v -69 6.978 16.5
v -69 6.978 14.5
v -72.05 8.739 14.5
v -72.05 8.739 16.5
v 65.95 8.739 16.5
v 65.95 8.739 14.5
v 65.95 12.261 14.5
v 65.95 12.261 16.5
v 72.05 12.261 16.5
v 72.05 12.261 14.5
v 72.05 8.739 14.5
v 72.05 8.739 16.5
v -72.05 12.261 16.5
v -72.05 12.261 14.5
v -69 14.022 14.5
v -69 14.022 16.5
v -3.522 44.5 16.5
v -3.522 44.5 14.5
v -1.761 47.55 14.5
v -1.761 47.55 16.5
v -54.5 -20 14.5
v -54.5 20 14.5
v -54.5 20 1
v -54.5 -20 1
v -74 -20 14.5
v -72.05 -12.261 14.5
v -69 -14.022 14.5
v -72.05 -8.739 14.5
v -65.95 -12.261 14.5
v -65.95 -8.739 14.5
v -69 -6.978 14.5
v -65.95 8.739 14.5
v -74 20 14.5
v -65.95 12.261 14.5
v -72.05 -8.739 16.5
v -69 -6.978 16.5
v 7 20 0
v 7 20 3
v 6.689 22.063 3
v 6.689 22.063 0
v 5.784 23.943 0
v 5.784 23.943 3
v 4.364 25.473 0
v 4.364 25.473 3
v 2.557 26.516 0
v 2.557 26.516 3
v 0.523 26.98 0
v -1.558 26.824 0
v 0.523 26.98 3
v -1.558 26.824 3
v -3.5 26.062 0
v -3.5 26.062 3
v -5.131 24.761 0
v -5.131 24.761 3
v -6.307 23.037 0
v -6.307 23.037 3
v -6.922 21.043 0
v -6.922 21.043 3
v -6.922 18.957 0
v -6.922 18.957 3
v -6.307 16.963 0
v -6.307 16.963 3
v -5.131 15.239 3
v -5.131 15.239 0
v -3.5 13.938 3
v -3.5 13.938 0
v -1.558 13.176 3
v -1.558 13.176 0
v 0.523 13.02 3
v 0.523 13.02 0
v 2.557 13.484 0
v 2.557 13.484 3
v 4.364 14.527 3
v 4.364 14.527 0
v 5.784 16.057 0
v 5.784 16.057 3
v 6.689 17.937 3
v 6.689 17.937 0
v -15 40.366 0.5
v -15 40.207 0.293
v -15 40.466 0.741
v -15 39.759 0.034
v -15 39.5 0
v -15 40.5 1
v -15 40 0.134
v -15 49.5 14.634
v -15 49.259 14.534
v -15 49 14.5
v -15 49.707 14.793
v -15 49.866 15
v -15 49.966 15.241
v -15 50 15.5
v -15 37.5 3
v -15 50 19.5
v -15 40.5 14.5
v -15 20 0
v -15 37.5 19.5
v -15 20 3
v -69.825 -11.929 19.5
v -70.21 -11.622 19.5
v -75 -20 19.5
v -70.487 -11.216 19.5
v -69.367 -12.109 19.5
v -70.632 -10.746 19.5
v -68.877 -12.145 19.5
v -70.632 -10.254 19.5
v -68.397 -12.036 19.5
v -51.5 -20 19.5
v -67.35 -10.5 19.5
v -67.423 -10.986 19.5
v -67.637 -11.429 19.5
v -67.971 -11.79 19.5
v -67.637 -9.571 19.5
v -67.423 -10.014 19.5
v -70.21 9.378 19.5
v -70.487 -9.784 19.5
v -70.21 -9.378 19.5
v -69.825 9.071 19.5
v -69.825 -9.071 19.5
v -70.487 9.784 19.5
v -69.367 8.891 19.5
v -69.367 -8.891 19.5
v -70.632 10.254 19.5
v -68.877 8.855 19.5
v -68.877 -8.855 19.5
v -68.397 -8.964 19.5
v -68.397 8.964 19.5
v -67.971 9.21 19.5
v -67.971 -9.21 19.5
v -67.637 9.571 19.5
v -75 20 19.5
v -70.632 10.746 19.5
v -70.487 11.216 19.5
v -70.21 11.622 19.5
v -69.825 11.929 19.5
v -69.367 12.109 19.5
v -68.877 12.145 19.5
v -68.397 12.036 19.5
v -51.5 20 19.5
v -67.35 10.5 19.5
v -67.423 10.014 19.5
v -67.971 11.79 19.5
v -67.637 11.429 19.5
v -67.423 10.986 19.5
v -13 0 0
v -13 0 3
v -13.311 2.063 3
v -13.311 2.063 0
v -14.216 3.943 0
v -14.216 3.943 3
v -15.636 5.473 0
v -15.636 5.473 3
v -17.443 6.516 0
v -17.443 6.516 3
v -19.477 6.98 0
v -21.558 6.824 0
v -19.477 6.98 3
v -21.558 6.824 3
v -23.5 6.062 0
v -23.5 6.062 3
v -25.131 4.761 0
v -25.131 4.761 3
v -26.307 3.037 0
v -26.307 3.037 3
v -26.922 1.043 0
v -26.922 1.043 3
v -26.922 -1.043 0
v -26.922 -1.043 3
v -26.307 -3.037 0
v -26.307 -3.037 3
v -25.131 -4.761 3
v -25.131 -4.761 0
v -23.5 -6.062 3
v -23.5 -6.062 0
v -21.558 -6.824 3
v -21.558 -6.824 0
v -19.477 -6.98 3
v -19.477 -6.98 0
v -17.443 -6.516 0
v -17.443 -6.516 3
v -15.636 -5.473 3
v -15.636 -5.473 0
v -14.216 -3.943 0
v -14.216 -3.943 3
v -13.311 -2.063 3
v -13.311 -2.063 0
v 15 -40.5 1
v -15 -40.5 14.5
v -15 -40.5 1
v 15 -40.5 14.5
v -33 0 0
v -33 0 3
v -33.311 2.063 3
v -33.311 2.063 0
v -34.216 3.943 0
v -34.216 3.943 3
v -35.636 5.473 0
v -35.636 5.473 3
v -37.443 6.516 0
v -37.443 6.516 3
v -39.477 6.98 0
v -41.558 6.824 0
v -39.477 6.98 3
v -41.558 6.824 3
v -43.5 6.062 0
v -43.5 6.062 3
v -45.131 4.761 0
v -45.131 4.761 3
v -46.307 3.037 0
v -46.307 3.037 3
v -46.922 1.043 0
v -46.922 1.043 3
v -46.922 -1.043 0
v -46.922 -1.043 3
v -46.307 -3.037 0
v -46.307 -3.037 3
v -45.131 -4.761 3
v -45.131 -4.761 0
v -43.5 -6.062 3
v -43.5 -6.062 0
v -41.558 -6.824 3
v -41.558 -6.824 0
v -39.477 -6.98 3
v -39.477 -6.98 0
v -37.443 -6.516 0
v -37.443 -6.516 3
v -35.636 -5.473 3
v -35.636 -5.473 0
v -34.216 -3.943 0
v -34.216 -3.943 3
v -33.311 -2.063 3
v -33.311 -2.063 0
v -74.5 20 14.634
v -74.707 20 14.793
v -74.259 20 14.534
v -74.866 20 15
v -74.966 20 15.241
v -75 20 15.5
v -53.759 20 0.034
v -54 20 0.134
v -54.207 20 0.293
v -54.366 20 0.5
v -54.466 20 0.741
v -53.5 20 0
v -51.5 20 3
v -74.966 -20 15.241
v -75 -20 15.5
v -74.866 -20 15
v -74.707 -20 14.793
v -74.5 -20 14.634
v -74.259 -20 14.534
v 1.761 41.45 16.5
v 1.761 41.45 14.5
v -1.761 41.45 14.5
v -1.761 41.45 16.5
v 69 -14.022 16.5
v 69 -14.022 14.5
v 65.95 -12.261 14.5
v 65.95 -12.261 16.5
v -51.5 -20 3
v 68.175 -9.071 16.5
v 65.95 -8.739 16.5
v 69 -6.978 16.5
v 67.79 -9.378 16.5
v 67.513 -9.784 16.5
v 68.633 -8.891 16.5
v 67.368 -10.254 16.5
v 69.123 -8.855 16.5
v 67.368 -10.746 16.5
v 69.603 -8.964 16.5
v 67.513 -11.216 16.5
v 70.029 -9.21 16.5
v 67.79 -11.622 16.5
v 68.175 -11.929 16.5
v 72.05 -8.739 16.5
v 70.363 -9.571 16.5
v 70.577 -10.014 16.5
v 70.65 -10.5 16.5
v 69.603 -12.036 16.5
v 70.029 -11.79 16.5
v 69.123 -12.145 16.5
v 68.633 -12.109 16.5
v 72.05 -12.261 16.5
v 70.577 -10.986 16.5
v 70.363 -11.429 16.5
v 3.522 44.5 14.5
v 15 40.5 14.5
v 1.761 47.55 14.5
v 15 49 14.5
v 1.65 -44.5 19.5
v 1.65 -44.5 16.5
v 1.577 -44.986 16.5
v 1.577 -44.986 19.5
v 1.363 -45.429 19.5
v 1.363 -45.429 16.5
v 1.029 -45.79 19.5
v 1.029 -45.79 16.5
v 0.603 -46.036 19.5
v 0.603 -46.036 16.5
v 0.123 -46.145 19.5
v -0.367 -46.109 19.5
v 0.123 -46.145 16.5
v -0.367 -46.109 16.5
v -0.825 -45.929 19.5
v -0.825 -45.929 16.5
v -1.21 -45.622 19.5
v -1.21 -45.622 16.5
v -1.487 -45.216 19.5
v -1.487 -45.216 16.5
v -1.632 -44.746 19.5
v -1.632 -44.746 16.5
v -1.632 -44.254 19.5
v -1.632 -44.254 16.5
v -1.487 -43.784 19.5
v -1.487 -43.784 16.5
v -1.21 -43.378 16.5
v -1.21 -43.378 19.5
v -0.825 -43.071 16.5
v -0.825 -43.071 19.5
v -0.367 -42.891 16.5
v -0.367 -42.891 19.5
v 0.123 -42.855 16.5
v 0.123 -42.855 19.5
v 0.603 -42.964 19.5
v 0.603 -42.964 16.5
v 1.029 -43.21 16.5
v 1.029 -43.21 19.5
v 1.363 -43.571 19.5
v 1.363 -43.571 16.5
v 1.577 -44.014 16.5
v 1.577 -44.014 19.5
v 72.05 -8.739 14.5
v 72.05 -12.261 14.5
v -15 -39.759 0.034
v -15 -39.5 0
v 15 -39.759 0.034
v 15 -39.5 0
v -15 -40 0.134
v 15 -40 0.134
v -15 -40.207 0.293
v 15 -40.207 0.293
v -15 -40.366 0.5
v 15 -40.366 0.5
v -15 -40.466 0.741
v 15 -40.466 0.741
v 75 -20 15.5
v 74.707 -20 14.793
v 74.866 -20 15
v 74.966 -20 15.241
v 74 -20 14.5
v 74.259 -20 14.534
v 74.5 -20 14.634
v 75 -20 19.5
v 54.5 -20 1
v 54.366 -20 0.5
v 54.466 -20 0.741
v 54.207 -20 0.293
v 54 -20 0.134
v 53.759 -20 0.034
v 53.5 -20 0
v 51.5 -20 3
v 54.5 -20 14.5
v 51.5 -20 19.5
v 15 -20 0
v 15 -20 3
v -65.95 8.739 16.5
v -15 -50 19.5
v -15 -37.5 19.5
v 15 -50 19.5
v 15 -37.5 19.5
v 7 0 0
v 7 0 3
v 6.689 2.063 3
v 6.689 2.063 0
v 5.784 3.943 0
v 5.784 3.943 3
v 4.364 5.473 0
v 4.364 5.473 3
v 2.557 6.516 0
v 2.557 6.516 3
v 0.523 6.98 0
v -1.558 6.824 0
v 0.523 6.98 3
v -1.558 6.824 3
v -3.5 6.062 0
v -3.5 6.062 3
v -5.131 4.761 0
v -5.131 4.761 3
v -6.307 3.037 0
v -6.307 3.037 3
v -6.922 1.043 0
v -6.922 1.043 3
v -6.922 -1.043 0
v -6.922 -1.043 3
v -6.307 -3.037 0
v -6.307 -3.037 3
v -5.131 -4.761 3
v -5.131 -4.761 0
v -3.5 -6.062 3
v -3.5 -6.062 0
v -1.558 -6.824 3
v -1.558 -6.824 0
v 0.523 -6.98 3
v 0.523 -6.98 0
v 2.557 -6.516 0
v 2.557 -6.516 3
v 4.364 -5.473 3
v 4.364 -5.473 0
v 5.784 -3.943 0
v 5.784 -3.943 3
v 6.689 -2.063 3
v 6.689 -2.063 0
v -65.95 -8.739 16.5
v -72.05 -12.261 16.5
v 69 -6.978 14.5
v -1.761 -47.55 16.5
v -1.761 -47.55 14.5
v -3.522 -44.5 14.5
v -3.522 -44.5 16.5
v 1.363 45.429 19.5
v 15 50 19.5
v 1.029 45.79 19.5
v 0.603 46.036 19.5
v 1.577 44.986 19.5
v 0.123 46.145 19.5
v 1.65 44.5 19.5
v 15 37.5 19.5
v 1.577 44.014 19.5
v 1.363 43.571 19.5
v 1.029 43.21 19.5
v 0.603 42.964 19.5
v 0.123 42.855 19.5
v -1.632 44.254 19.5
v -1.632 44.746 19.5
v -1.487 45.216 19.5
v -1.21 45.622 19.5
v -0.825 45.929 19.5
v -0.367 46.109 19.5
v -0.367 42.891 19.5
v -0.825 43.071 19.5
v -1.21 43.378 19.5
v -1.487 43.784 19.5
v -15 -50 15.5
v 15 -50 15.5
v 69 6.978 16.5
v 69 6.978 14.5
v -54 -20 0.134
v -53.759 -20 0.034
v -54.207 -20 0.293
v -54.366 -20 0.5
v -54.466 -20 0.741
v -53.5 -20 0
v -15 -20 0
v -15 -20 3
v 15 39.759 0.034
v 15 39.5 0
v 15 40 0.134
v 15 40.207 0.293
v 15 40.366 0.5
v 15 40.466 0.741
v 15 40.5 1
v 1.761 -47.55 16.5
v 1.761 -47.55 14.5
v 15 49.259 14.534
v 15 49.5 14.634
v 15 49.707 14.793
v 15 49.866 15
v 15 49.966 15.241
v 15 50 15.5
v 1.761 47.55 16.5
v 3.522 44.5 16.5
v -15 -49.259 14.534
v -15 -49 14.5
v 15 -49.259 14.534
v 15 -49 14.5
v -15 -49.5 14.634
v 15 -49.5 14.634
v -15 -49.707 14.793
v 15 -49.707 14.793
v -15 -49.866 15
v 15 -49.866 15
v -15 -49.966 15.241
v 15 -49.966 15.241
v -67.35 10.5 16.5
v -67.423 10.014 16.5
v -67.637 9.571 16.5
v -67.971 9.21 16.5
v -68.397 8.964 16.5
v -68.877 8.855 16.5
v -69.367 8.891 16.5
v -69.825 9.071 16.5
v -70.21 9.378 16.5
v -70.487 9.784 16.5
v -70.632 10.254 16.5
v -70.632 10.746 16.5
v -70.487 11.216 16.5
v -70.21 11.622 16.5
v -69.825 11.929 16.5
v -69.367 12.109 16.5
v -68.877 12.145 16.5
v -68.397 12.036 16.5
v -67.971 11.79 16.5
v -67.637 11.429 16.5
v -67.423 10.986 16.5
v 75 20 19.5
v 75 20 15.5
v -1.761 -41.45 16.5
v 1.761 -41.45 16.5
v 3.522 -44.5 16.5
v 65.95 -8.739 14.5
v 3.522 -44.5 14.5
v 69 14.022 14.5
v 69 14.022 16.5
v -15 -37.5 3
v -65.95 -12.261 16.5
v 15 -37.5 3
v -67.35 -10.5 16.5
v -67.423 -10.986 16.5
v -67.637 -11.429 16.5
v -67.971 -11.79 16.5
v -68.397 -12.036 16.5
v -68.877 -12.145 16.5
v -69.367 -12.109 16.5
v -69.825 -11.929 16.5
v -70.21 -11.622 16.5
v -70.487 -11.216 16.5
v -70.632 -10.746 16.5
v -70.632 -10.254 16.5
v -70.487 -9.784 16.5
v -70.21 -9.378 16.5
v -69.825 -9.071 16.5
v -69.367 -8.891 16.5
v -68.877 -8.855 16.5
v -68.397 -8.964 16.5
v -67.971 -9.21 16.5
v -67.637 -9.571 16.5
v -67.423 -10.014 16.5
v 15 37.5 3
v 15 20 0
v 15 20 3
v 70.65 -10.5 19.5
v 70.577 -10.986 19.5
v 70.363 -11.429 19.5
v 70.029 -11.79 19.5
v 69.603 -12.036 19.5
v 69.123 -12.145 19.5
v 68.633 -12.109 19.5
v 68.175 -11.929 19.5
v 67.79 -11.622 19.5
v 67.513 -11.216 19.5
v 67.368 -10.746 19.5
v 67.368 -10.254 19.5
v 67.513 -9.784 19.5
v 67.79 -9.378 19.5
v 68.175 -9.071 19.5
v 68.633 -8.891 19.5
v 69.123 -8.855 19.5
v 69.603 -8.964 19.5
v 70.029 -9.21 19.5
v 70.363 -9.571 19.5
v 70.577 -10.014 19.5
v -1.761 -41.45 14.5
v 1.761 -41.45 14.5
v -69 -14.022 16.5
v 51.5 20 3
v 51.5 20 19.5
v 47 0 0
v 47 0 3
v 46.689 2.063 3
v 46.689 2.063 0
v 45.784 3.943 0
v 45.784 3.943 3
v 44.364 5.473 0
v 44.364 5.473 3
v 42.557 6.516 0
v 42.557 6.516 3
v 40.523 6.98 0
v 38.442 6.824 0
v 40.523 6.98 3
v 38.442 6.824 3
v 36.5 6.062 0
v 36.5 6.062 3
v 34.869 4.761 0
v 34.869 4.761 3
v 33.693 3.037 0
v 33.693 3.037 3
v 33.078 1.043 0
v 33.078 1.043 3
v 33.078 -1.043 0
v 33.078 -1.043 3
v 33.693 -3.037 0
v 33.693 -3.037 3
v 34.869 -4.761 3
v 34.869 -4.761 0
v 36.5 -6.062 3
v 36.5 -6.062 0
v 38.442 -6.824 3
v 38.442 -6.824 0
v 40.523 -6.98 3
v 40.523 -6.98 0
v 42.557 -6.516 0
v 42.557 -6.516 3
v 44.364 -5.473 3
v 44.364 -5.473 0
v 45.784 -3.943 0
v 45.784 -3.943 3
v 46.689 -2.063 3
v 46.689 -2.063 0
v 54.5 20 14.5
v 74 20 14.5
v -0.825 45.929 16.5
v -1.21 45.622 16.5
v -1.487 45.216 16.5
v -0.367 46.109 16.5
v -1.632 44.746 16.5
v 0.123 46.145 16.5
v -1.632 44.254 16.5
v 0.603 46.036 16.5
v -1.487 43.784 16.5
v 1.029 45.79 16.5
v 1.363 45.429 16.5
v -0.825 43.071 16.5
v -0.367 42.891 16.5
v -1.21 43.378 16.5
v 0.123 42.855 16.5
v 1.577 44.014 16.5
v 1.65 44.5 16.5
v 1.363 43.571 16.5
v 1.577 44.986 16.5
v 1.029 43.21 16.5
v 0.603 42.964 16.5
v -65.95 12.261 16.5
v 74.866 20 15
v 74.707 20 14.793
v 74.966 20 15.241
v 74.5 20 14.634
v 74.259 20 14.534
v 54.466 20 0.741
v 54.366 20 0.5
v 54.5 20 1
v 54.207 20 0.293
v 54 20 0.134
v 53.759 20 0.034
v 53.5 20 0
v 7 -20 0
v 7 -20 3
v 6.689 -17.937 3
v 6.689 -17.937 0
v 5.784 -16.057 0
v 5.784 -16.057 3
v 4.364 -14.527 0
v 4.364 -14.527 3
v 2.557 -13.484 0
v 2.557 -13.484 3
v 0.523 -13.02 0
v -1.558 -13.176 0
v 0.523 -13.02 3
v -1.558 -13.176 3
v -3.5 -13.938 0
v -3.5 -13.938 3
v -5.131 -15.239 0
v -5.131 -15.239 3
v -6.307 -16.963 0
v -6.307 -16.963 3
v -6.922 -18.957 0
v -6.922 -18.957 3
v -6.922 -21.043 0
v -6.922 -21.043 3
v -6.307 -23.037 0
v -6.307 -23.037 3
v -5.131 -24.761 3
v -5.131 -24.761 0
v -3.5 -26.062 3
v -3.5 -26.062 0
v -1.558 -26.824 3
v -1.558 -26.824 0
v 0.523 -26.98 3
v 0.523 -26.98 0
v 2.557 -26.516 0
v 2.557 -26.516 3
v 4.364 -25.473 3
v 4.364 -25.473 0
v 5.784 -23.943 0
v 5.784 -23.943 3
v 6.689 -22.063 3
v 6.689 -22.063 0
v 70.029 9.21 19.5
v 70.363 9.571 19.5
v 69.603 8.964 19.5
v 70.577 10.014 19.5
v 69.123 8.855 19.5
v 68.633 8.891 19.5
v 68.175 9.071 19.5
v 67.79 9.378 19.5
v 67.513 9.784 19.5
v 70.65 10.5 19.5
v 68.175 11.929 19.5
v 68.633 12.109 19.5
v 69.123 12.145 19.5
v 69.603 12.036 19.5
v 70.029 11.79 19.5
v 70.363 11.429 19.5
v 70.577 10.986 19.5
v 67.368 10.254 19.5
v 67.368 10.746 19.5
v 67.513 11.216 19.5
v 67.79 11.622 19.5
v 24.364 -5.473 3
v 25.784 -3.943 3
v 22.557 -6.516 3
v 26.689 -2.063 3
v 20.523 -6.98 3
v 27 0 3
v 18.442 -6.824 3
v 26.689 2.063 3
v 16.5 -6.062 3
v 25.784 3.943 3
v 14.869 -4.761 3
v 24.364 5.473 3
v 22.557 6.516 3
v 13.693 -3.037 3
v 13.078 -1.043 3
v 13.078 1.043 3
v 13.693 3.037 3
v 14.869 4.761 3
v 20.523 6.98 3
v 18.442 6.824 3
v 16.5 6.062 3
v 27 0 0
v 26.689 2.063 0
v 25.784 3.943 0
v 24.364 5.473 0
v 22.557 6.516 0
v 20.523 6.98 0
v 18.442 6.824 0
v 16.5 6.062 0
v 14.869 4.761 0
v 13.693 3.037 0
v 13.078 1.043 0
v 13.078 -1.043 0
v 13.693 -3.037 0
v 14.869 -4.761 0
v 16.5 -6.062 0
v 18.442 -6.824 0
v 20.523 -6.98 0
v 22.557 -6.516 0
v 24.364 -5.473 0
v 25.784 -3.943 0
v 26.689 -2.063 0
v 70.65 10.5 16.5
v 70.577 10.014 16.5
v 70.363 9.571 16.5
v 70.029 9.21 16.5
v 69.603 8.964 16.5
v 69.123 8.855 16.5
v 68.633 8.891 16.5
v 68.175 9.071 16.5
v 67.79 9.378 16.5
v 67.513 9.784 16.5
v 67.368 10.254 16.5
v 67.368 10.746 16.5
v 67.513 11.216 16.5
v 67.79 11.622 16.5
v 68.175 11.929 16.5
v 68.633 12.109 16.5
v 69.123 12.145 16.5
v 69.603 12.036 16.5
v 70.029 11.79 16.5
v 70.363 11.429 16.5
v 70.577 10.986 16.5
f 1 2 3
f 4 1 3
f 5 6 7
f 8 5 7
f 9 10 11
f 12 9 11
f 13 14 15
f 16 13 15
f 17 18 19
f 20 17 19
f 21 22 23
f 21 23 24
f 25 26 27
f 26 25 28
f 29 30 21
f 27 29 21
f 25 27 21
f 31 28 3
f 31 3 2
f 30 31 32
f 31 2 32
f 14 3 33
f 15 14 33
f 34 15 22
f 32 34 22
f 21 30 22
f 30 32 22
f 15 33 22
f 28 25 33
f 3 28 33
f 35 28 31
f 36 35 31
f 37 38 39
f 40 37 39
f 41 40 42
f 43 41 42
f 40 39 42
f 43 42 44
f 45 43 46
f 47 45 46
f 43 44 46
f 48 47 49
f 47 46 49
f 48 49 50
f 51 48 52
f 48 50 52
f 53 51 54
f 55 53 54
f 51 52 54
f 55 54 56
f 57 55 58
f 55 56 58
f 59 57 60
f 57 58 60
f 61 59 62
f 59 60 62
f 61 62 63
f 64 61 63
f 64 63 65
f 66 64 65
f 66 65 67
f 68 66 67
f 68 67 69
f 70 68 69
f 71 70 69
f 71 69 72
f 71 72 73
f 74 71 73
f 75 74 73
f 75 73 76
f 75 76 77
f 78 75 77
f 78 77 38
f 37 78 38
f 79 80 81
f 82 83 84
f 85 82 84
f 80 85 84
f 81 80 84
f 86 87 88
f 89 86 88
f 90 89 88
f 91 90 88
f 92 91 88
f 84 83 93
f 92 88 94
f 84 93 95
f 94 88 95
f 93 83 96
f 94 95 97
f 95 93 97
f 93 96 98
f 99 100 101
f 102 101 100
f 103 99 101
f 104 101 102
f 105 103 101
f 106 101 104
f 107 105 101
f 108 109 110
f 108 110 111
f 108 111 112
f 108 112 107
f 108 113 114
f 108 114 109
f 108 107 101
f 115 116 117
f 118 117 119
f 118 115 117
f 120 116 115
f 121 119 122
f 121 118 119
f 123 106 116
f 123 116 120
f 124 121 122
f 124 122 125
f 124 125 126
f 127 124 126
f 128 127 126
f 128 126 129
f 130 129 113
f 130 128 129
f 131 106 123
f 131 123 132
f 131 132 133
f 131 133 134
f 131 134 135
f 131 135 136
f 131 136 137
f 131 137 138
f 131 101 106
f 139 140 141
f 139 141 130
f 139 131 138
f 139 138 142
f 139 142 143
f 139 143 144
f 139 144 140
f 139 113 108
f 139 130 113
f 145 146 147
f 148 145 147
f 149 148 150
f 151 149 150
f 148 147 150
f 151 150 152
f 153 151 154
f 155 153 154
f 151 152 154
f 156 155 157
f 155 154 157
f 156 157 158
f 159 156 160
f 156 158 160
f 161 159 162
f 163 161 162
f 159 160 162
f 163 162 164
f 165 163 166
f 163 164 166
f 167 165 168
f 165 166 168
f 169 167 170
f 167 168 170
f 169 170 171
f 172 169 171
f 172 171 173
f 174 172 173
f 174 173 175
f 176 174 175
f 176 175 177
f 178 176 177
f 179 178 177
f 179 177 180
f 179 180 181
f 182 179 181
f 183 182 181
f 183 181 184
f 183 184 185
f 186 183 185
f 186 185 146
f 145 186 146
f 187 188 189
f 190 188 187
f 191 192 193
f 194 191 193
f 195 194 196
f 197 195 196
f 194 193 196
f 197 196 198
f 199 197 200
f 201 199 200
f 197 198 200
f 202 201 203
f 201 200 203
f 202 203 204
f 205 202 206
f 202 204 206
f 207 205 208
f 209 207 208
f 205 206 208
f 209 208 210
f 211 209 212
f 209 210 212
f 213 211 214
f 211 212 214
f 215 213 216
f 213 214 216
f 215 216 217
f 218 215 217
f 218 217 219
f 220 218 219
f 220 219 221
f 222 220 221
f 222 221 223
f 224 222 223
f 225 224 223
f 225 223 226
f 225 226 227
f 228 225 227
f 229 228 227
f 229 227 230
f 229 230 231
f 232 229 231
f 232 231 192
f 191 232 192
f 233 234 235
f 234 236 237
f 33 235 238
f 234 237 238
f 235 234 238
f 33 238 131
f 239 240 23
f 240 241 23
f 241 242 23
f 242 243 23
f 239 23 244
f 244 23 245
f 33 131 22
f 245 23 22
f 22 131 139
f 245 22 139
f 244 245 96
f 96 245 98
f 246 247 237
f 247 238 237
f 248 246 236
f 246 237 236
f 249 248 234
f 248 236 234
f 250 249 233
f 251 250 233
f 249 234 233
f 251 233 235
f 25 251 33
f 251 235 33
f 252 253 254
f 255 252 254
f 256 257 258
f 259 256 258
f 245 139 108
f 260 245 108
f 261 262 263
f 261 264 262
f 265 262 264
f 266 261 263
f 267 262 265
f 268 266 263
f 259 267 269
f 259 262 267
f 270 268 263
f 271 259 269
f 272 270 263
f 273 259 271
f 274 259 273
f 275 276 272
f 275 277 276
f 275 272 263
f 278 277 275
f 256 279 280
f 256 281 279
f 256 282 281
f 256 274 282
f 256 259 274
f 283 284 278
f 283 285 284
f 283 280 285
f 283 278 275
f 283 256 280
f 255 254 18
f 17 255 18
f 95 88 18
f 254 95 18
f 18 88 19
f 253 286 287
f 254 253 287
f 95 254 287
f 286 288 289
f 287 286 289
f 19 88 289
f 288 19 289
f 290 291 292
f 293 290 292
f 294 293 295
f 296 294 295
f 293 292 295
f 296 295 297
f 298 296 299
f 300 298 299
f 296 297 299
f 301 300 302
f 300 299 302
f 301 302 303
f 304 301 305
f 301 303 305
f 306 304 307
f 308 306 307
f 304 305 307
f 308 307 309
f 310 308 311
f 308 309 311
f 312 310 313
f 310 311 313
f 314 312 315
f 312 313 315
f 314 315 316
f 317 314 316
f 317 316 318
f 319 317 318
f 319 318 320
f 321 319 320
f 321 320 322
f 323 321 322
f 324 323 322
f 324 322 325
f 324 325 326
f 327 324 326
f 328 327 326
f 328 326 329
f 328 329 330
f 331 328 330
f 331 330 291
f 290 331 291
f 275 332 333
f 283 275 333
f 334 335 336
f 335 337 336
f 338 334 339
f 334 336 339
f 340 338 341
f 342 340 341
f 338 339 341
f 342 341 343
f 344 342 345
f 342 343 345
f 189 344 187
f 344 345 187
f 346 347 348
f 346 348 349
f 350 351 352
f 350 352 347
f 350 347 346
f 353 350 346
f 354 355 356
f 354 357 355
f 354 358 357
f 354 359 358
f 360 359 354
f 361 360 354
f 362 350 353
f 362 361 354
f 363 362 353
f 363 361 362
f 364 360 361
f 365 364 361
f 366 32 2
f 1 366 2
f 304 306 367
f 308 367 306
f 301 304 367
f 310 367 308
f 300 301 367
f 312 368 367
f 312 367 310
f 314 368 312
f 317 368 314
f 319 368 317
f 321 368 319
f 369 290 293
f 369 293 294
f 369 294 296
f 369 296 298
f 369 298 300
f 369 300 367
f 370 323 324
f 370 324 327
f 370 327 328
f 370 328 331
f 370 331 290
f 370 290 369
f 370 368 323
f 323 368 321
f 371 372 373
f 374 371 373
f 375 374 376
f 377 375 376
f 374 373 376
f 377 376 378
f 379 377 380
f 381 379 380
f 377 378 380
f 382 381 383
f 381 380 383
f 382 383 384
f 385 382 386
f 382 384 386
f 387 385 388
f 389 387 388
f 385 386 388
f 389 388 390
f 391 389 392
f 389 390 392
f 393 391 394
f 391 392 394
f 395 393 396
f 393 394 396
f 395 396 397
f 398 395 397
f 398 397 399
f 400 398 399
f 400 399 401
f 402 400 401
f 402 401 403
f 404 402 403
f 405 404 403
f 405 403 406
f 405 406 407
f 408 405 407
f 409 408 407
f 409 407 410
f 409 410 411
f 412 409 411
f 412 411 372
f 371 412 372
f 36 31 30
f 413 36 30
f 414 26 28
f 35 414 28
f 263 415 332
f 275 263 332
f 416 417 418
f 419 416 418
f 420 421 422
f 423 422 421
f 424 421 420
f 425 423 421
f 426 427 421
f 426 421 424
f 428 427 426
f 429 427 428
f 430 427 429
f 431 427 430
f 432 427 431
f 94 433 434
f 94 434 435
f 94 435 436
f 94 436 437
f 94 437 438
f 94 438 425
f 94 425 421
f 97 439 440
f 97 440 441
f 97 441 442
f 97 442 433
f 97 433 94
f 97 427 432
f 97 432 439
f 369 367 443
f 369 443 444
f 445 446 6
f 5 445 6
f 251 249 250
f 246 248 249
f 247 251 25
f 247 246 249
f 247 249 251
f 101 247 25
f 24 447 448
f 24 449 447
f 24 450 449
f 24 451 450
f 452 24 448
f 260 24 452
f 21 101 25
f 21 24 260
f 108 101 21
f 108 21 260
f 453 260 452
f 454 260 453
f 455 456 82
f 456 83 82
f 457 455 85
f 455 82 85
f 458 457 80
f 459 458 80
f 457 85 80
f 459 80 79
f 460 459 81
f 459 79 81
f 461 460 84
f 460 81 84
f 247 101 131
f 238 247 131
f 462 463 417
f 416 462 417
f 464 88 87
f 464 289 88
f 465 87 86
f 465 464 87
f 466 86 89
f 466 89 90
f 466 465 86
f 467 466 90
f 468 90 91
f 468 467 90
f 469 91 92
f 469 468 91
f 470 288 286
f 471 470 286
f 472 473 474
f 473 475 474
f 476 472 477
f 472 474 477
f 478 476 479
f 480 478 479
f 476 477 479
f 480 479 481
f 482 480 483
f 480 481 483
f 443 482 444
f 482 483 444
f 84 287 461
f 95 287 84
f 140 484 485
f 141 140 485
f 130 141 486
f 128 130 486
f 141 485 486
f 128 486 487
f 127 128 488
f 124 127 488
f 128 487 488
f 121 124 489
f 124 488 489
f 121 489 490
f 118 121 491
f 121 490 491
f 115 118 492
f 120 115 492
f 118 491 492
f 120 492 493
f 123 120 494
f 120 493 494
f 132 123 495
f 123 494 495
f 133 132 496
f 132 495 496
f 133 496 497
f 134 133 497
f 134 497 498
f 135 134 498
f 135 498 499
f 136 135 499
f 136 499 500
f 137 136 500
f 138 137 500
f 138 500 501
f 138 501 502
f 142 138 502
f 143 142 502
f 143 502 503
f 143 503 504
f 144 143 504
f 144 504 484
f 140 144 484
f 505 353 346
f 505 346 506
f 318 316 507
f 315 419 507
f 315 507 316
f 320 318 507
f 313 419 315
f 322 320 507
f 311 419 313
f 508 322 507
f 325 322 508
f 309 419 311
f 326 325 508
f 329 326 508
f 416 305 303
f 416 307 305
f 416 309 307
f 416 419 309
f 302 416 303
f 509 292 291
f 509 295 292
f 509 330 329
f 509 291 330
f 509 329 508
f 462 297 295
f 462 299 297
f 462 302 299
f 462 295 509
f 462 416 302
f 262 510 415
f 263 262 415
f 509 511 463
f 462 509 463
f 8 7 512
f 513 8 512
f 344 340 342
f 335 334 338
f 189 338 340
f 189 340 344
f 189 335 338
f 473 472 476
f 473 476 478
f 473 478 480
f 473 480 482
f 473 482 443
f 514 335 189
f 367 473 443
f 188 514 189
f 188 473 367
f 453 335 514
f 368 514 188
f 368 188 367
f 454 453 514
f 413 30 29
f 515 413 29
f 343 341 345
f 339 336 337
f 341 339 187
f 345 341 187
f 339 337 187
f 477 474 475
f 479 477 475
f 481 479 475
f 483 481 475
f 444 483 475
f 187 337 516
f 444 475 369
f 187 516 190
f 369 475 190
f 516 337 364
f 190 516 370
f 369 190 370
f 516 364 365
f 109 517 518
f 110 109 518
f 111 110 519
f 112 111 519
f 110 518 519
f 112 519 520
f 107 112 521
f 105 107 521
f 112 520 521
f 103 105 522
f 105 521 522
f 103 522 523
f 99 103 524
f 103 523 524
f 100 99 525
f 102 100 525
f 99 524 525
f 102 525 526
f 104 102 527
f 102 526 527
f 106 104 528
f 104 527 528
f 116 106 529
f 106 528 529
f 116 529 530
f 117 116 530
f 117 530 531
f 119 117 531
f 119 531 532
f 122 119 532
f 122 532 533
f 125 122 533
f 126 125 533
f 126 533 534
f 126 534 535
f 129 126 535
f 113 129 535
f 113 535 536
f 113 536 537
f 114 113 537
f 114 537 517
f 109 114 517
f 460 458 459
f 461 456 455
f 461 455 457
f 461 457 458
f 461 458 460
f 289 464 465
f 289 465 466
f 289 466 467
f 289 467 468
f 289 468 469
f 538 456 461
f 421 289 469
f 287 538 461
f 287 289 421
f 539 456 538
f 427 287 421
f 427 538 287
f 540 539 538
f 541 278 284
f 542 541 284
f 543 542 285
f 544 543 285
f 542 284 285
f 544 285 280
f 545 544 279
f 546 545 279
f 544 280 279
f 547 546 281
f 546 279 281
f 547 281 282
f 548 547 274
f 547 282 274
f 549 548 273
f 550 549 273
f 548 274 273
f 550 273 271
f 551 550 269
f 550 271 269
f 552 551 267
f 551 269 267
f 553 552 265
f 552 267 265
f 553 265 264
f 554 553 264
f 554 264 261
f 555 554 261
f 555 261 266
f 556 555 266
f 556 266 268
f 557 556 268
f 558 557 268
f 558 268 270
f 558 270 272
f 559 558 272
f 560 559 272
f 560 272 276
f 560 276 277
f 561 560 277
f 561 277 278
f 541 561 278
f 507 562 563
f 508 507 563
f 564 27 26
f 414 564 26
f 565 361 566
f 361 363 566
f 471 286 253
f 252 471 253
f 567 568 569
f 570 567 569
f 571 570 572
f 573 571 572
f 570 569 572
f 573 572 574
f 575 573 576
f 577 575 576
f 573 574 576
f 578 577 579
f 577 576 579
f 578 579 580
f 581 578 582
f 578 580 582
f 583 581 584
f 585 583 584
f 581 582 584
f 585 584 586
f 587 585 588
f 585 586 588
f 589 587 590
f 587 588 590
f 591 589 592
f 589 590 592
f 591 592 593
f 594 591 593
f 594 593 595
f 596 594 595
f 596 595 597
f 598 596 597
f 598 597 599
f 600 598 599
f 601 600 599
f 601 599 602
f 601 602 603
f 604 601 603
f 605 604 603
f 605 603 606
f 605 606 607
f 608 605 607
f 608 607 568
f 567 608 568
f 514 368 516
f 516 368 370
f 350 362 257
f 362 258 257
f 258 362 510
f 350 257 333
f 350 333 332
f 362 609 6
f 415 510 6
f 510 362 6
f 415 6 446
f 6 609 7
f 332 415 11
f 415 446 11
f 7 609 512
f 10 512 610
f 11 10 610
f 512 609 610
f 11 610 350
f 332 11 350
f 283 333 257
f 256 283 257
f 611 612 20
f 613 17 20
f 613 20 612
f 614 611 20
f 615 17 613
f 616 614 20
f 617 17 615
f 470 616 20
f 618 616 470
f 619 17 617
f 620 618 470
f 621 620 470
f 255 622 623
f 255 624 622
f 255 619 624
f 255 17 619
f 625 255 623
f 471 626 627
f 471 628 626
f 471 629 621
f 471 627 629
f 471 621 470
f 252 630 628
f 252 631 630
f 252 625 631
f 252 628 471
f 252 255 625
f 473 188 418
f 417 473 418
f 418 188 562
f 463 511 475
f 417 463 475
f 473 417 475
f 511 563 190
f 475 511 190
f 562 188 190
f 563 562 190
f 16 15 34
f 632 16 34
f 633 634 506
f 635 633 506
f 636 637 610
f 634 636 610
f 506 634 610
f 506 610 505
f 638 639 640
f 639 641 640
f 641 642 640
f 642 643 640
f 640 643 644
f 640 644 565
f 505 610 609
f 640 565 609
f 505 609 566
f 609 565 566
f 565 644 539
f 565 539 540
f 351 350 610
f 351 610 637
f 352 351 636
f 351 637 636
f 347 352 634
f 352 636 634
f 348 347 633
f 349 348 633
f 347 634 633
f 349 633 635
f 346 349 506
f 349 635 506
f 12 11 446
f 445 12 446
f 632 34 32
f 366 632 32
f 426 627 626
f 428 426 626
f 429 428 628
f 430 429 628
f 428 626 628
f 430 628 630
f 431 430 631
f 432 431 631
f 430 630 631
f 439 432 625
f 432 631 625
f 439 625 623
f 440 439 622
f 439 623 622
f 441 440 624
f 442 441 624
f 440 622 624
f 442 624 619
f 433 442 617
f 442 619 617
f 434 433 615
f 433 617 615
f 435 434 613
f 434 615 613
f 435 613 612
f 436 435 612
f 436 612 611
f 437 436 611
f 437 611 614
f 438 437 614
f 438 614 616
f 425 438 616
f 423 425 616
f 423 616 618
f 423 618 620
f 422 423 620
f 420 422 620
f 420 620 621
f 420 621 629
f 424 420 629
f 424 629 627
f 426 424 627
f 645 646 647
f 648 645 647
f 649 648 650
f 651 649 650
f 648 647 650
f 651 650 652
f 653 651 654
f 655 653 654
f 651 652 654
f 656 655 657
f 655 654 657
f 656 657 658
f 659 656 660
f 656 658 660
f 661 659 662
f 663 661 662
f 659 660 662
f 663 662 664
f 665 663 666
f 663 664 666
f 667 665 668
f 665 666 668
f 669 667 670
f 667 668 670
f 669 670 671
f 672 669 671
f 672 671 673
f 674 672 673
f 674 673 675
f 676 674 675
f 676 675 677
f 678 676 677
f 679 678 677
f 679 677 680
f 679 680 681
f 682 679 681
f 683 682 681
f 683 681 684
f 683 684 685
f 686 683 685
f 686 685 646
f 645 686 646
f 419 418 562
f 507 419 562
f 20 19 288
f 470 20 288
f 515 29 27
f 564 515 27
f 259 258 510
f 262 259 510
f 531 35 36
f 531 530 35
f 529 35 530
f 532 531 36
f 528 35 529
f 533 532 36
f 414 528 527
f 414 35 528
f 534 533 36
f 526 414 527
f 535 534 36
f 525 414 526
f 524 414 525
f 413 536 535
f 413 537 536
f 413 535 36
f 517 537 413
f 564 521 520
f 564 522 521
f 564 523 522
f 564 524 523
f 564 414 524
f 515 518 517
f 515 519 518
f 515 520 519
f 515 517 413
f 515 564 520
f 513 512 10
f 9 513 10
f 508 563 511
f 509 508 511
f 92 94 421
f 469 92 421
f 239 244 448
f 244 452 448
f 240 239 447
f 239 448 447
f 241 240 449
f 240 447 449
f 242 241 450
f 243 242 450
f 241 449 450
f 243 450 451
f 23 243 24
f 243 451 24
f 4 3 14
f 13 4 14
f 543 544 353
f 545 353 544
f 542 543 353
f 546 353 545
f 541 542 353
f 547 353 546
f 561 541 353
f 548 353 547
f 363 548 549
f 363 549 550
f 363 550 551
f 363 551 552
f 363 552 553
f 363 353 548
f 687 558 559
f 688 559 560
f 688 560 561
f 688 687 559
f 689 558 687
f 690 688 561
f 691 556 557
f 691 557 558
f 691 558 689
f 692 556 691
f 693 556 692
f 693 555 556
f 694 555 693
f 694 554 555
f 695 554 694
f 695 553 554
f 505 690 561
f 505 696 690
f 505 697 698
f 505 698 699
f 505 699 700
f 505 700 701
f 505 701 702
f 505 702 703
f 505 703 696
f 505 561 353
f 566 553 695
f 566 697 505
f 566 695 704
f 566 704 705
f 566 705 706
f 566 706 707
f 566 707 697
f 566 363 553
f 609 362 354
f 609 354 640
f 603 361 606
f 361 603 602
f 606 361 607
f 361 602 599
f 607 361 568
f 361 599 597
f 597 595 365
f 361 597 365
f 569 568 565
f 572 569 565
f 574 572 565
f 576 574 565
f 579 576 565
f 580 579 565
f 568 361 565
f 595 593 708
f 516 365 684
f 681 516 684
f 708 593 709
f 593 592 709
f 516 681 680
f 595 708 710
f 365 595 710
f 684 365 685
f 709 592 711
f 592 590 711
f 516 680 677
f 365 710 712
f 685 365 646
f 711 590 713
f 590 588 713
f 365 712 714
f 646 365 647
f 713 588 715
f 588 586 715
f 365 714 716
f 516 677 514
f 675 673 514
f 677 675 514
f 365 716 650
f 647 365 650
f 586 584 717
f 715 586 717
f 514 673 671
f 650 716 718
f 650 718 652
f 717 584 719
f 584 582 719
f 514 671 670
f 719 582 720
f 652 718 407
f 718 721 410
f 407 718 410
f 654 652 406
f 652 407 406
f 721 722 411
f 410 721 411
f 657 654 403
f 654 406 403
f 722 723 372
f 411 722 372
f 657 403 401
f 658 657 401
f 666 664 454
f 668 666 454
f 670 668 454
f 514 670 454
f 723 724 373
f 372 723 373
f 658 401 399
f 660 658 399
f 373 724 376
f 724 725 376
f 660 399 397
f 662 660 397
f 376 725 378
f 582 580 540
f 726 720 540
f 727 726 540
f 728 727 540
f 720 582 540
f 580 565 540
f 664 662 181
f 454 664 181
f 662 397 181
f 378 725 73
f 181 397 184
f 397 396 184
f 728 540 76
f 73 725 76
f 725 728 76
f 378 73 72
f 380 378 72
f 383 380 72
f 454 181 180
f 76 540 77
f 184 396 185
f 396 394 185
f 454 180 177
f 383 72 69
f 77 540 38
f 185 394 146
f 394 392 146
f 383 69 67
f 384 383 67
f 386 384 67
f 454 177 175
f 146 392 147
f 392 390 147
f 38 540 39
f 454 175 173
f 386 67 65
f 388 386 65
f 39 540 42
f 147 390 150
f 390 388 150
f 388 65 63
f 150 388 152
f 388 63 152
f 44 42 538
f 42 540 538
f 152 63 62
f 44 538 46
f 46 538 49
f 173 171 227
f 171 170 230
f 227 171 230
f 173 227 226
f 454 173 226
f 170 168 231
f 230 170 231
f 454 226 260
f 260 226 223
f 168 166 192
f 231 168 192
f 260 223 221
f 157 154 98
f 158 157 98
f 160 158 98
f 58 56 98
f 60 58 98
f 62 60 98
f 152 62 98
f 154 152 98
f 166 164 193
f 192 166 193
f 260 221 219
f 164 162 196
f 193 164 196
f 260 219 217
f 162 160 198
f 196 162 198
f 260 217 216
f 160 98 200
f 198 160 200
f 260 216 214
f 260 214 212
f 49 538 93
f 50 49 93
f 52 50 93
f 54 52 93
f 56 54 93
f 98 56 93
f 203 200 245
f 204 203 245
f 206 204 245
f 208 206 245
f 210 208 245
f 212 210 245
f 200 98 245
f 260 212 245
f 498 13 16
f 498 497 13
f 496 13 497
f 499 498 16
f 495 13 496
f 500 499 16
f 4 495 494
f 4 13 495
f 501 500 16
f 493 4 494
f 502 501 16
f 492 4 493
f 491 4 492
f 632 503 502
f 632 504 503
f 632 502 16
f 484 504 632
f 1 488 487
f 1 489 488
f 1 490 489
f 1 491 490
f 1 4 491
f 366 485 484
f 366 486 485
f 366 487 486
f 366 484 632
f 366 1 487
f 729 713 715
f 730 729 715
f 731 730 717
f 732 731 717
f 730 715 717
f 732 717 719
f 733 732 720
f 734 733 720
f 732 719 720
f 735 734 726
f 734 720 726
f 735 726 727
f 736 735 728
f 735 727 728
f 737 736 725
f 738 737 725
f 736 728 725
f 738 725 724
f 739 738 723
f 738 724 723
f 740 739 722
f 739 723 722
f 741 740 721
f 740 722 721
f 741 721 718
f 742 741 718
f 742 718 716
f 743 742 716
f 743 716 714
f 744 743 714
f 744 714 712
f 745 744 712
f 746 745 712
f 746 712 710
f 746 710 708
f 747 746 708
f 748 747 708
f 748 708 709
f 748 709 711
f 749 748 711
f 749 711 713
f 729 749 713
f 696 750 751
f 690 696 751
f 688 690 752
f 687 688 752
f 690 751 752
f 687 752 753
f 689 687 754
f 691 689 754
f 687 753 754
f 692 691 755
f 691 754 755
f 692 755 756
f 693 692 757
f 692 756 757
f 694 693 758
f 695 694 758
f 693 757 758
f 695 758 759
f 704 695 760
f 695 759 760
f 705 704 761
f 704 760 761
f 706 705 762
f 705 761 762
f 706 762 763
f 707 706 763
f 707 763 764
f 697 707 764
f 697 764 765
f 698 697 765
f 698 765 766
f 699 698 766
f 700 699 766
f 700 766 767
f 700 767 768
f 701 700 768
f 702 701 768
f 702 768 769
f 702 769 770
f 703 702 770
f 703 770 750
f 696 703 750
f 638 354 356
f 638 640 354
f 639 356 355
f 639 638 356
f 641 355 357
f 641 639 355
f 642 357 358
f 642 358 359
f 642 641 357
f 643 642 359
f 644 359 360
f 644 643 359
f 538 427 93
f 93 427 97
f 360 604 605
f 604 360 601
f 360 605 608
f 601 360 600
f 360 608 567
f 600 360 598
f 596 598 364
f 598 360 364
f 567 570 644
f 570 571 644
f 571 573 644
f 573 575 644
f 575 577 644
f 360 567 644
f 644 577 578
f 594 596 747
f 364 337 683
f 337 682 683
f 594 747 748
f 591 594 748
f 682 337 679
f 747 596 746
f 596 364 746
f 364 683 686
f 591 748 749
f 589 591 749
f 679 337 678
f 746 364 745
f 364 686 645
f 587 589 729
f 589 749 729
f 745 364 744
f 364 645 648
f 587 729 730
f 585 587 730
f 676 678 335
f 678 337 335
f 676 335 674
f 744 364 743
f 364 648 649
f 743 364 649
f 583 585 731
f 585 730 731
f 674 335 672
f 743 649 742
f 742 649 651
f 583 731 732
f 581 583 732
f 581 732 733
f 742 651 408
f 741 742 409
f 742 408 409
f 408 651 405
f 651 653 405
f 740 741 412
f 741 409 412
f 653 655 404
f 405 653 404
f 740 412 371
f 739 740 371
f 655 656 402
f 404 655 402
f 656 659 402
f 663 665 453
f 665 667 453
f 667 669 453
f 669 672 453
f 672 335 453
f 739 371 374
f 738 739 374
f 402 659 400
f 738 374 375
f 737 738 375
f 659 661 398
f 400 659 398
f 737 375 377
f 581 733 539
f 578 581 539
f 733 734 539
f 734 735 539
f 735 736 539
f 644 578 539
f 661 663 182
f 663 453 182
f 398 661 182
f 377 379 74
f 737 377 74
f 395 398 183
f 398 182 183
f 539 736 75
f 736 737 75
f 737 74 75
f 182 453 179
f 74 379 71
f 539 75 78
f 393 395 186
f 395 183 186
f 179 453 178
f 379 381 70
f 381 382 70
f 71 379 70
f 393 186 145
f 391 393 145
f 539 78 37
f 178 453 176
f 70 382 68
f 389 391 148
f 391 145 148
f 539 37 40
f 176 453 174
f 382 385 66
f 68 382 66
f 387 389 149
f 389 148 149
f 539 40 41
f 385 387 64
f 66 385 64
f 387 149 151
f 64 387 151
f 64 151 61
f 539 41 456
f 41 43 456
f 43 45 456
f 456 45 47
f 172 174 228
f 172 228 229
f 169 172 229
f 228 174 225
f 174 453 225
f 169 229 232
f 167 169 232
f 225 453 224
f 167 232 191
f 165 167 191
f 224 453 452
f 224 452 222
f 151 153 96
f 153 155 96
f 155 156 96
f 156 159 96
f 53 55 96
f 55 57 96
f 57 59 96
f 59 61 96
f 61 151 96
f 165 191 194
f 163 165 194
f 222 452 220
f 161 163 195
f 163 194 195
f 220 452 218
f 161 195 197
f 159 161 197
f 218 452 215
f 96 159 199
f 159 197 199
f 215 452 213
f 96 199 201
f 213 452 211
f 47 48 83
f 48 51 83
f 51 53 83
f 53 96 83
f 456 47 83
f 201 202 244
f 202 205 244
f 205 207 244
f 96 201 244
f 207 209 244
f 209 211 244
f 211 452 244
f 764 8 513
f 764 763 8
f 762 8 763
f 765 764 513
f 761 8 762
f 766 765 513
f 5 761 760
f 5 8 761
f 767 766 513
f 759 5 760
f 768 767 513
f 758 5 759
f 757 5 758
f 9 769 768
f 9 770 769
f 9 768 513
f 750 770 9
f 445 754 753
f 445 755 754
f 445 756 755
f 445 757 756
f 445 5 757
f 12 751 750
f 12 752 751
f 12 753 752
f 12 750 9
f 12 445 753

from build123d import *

# Parameters (mm, degrees)
PAD_DEPTH       = 3
SKETCH001_R     = 7
POCKET_DEPTH    = 3.001
SKETCH002_W     = 30
SKETCH002_H     = 19.5
PAD001_DEPTH    = 3
SKETCH003_W     = 30
SKETCH003_H     = 19.5
PAD002_DEPTH    = 3
SKETCH004_W     = 40
SKETCH004_H     = 19.5
PAD003_DEPTH    = 3
SKETCH005_W     = 40
SKETCH005_H     = 19.5
PAD004_DEPTH    = 3
SKETCH006_W     = 23.5
SKETCH006_H     = 40
SKETCH006_W_2   = 30
SKETCH006_H_2   = 12.5
PAD005_DEPTH    = 5
SKETCH007_R     = 1.65
POCKET001_DEPTH = 5.001
POCKET002_DEPTH = 2
FILLET_R        = 1
FILLET001_R     = 1
FILLET002_R     = 1
FILLET003_R     = 1
FILLET004_R     = 1
FILLET005_R     = 1
FILLET006_R     = 1
FILLET007_R     = 1


with BuildPart() as part:
    # Sketch → Pad (new body)
    with BuildSketch(Plane.XY):
        Polygon((-51.5, -20), (-51.5, 20), (-15, 20), (-15, 37.5), (15, 37.5), (15, 20), (51.5, 20), (51.5, -20), (15, -20), (15, -37.5), (-15, -37.5), (-15, -20), align=None)
    extrude(amount=PAD_DEPTH)

    # Sketch001 (on Face14 of Pad) → Pocket (cut, through all)
    with BuildSketch(Plane.XY.offset(3)):
        with Locations((-40, 0)):
            Circle(SKETCH001_R)
        with Locations((-20, 0)):
            Circle(SKETCH001_R)
        Circle(SKETCH001_R)
        with Locations((20, 0)):
            Circle(SKETCH001_R)
        with Locations((40, 0)):
            Circle(SKETCH001_R)
        with Locations((0, -20)):
            Circle(SKETCH001_R)
        with Locations((0, 20)):
            Circle(SKETCH001_R)
    extrude(amount=-POCKET_DEPTH, mode=Mode.SUBTRACT)

    # Sketch002 (on Face8 of Pocket) → Pad001 (join)
    with BuildSketch(Plane.XZ.offset(37.5)):
        with Locations((0, 9.75)):
            Rectangle(SKETCH002_W, SKETCH002_H)
    extrude(amount=PAD001_DEPTH)

    # Sketch003 (on Face9 of Pad001) → Pad002 (join)
    with BuildSketch(Plane(origin=(0, 37.5, 0), x_dir=(-1, 0, 0), z_dir=(0, 1, 0))):
        with Locations((0, 9.75)):
            Rectangle(SKETCH003_W, SKETCH003_H)
    extrude(amount=PAD002_DEPTH)

    # Sketch004 (on Face1 of Pad002) → Pad003 (join)
    with BuildSketch(Plane(origin=(-51.5, 0, 0), x_dir=(0, -1, 0), z_dir=(-1, 0, 0))):
        with Locations((0, 9.75)):
            Rectangle(SKETCH004_W, SKETCH004_H)
    extrude(amount=PAD003_DEPTH)

    # Sketch005 (on Face19 of Pad003) → Pad004 (join)
    with BuildSketch(Plane.YZ.offset(51.5)):
        with Locations((0, 9.75)):
            Rectangle(SKETCH005_W, SKETCH005_H)
    extrude(amount=PAD004_DEPTH)

    # Sketch006 (on Face8 of Pad004) → Pad005 (join)
    with BuildSketch(Plane.XY.offset(19.5)):
        with Locations((-63.25, 0)):
            Rectangle(SKETCH006_W, SKETCH006_H)
        with Locations((63.25, 0)):
            Rectangle(SKETCH006_W, SKETCH006_H)
        with Locations((0, 43.75)):
            Rectangle(SKETCH006_W_2, SKETCH006_H_2)
        with Locations((0, -43.75)):
            Rectangle(SKETCH006_W_2, SKETCH006_H_2)
    extrude(amount=-PAD005_DEPTH)

    # Sketch007 (on Face60 of Pad005) → Pocket001 (cut, through all)
    with BuildSketch(Plane(origin=(0, 0, 14.5), x_dir=(1, 0, 0), z_dir=(0, 0, -1))):
        with Locations((-69, 10.5)):
            Circle(SKETCH007_R)
        with Locations((69, 10.5)):
            Circle(SKETCH007_R)
        with Locations((0, 44.5)):
            Circle(SKETCH007_R)
        with Locations((0, -44.5)):
            Circle(SKETCH007_R)
        with Locations((-69, -10.5)):
            Circle(SKETCH007_R)
        with Locations((69, -10.5)):
            Circle(SKETCH007_R)
    extrude(amount=-POCKET001_DEPTH, mode=Mode.SUBTRACT)

    # Sketch008 (on Face36 of Pocket001) → Pocket002 (cut)
    with BuildSketch(Plane(origin=(0, 0, 14.5), x_dir=(1, 0, 0), z_dir=(0, 0, -1))):
        Polygon((-65.95, 8.739082), (-65.95, 12.260918), (-69, 14.021837), (-72.05, 12.260918), (-72.05, 8.739082), (-69, 6.978163), align=None)
        Polygon((-65.95, -12.260918), (-65.95, -8.739082), (-69, -6.978163), (-72.05, -8.739082), (-72.05, -12.260918), (-69, -14.021837), align=None)
        Polygon((72.05, 8.739082), (72.05, 12.260918), (69, 14.021837), (65.95, 12.260918), (65.95, 8.739082), (69, 6.978163), align=None)
        Polygon((72.05, -12.260918), (72.05, -8.739082), (69, -6.978163), (65.95, -8.739082), (65.95, -12.260918), (69, -14.021837), align=None)
        Polygon((1.760918, 41.45), (3.521837, 44.5), (1.760918, 47.55), (-1.760918, 47.55), (-3.521837, 44.5), (-1.760918, 41.45), align=None)
        Polygon((1.760918, -47.55), (3.521837, -44.5), (1.760918, -41.45), (-1.760918, -41.45), (-3.521837, -44.5), (-1.760918, -47.55), align=None)
    extrude(amount=-POCKET002_DEPTH, mode=Mode.SUBTRACT)

    # Fillet
    fillet_edges = [part.edges().sort_by_distance(p)[0] for p in [
        (-75, 0, 14.5),
    ]]
    fillet(fillet_edges, radius=FILLET_R)

    # Fillet001
    fillet001_edges = [part.edges().sort_by_distance(p)[0] for p in [
        (0, 50, 14.5),
    ]]
    fillet(fillet001_edges, radius=FILLET001_R)

    # Fillet002
    fillet002_edges = [part.edges().sort_by_distance(p)[0] for p in [
        (0, -50, 14.5),
    ]]
    fillet(fillet002_edges, radius=FILLET002_R)

    # Fillet003
    fillet003_edges = [part.edges().sort_by_distance(p)[0] for p in [
        (75, 0, 14.5),
    ]]
    fillet(fillet003_edges, radius=FILLET003_R)

    # Fillet004
    fillet004_edges = [part.edges().sort_by_distance(p)[0] for p in [
        (54.5, 0, 0),
    ]]
    fillet(fillet004_edges, radius=FILLET004_R)

    # Fillet005
    fillet005_edges = [part.edges().sort_by_distance(p)[0] for p in [
        (0, 40.5, 0),
    ]]
    fillet(fillet005_edges, radius=FILLET005_R)

    # Fillet006
    fillet006_edges = [part.edges().sort_by_distance(p)[0] for p in [
        (-54.5, 0, 0),
    ]]
    fillet(fillet006_edges, radius=FILLET006_R)

    # Fillet007
    fillet007_edges = [part.edges().sort_by_distance(p)[0] for p in [
        (0, -40.5, 0),
    ]]
    fillet(fillet007_edges, radius=FILLET007_R)


solid = part.part
